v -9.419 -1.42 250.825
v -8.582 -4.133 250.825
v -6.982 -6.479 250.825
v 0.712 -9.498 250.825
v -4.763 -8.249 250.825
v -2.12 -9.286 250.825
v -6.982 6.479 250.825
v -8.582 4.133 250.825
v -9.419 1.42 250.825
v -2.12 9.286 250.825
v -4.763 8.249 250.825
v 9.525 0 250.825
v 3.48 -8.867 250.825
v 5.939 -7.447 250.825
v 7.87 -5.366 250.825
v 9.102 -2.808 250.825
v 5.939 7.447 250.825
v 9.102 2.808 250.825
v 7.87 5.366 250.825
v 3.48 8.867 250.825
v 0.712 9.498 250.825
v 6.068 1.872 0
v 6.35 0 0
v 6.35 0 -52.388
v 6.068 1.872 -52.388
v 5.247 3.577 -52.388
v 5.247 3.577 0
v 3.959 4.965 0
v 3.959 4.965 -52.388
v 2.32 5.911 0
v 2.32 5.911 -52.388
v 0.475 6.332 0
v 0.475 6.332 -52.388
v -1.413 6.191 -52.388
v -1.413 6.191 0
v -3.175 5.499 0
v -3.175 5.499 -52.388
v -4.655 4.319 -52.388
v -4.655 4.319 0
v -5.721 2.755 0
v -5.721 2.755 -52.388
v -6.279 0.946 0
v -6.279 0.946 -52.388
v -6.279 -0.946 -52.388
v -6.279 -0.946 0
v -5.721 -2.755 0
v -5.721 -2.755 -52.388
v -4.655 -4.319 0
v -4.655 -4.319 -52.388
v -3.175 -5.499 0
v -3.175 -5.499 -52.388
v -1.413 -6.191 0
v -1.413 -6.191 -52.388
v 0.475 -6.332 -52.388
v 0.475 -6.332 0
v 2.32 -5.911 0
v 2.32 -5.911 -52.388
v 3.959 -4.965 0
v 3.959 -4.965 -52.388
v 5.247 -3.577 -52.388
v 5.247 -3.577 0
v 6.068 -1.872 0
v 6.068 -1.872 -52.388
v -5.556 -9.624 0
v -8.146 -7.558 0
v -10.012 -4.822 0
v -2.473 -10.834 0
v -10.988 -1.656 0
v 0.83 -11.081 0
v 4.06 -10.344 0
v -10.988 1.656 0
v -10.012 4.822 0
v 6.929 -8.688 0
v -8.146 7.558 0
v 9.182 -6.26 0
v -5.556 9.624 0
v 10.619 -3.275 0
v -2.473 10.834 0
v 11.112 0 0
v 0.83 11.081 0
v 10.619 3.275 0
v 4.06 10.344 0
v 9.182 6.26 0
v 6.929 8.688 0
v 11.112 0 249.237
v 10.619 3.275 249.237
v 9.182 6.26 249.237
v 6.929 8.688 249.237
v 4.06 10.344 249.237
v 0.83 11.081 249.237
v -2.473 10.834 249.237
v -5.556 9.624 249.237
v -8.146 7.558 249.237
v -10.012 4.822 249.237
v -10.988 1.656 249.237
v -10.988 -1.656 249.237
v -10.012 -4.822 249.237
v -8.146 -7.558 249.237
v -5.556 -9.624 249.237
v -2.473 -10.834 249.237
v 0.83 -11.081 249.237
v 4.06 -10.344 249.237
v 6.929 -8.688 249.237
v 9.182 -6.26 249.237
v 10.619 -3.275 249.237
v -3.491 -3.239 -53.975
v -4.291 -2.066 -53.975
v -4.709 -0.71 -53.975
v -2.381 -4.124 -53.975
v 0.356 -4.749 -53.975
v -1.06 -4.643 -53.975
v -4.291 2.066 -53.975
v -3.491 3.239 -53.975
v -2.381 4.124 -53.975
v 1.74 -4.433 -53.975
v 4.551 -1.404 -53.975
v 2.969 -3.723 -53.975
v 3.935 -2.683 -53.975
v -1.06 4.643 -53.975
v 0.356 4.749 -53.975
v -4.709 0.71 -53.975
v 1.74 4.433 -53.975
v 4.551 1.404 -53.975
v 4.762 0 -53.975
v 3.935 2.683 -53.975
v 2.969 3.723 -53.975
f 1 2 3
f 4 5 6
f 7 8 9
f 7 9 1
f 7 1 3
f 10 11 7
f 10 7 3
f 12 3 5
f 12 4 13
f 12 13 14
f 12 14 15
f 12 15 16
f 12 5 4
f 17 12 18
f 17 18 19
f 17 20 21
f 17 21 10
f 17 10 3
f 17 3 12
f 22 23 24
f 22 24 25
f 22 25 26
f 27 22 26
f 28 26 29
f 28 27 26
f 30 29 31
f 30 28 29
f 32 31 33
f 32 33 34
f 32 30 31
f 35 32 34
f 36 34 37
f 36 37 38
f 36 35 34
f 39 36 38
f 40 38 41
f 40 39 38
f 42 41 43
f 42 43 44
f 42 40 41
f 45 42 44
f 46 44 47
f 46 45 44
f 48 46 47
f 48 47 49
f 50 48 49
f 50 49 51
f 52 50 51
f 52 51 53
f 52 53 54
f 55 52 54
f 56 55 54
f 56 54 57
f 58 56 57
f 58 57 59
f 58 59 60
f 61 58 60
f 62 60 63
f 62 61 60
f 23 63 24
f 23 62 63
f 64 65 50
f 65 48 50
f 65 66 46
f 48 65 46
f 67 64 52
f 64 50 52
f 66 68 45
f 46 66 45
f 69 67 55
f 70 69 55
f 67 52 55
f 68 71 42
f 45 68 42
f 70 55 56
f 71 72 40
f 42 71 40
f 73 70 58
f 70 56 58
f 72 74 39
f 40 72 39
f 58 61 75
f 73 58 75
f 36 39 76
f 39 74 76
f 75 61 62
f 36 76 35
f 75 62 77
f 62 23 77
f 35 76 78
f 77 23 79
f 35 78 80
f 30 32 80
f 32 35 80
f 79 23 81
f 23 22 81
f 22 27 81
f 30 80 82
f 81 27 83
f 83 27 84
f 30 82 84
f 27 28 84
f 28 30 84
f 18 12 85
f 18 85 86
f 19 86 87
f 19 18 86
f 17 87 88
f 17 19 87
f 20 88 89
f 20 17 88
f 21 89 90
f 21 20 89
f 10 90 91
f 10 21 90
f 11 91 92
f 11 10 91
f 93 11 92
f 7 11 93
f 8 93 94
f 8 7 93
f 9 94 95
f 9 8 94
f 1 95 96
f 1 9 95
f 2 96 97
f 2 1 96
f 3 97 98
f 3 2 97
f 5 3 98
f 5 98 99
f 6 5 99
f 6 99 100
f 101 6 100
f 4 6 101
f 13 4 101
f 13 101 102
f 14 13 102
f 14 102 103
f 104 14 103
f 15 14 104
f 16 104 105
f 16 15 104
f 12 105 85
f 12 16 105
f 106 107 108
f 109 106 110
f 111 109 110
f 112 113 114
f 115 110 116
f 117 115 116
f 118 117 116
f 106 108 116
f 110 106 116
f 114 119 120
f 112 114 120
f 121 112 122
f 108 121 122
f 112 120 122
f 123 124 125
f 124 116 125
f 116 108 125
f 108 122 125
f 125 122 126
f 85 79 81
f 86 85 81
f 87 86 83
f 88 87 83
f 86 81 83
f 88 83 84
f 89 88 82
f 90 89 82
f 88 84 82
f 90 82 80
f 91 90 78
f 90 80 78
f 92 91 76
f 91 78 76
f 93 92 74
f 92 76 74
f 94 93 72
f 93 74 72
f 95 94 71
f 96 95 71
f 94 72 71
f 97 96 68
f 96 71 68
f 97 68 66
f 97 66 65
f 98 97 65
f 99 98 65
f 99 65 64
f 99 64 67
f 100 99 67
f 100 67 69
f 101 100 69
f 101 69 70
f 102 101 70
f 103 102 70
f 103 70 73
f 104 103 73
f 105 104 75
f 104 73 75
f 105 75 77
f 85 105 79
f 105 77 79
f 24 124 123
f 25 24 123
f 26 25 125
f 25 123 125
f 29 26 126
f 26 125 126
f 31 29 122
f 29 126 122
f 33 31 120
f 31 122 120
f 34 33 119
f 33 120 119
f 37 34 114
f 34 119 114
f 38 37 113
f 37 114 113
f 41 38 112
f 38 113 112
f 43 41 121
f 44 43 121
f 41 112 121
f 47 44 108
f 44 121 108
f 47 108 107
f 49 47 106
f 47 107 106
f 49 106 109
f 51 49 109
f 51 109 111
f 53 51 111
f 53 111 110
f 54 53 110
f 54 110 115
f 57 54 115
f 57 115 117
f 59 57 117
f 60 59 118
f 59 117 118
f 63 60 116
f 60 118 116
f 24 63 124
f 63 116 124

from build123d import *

# Parameters (mm, degrees)
F0_R     = 11.1125
F0_R_2   = 6.35
F1_DEPTH = 250.825
F2_DEPTH = 53.975
F3_SIZE2 = 1.5875
F3_SIZE  = 1.5875


with BuildPart() as f1:
    # F0 (on Top) → F1 (new body)
    with BuildSketch(Plane.XY):
        Circle(F0_R)
        Circle(F0_R_2, mode=Mode.SUBTRACT)
        Circle(F0_R_2)
    extrude(amount=F1_DEPTH)

    # F0 (on Top) → F2 (join)
    with BuildSketch(Plane.XY):
        Circle(F0_R_2)
    extrude(amount=-F2_DEPTH)

    # F3
    f3_edges = [f1.edges().sort_by_distance(p)[0] for p in [
        (-11.1125, 0, 250.825),
        (-6.35, 0, -53.975),
    ]]
    chamfer(f3_edges, length=F3_SIZE, length2=F3_SIZE2)


solid = f1.part
